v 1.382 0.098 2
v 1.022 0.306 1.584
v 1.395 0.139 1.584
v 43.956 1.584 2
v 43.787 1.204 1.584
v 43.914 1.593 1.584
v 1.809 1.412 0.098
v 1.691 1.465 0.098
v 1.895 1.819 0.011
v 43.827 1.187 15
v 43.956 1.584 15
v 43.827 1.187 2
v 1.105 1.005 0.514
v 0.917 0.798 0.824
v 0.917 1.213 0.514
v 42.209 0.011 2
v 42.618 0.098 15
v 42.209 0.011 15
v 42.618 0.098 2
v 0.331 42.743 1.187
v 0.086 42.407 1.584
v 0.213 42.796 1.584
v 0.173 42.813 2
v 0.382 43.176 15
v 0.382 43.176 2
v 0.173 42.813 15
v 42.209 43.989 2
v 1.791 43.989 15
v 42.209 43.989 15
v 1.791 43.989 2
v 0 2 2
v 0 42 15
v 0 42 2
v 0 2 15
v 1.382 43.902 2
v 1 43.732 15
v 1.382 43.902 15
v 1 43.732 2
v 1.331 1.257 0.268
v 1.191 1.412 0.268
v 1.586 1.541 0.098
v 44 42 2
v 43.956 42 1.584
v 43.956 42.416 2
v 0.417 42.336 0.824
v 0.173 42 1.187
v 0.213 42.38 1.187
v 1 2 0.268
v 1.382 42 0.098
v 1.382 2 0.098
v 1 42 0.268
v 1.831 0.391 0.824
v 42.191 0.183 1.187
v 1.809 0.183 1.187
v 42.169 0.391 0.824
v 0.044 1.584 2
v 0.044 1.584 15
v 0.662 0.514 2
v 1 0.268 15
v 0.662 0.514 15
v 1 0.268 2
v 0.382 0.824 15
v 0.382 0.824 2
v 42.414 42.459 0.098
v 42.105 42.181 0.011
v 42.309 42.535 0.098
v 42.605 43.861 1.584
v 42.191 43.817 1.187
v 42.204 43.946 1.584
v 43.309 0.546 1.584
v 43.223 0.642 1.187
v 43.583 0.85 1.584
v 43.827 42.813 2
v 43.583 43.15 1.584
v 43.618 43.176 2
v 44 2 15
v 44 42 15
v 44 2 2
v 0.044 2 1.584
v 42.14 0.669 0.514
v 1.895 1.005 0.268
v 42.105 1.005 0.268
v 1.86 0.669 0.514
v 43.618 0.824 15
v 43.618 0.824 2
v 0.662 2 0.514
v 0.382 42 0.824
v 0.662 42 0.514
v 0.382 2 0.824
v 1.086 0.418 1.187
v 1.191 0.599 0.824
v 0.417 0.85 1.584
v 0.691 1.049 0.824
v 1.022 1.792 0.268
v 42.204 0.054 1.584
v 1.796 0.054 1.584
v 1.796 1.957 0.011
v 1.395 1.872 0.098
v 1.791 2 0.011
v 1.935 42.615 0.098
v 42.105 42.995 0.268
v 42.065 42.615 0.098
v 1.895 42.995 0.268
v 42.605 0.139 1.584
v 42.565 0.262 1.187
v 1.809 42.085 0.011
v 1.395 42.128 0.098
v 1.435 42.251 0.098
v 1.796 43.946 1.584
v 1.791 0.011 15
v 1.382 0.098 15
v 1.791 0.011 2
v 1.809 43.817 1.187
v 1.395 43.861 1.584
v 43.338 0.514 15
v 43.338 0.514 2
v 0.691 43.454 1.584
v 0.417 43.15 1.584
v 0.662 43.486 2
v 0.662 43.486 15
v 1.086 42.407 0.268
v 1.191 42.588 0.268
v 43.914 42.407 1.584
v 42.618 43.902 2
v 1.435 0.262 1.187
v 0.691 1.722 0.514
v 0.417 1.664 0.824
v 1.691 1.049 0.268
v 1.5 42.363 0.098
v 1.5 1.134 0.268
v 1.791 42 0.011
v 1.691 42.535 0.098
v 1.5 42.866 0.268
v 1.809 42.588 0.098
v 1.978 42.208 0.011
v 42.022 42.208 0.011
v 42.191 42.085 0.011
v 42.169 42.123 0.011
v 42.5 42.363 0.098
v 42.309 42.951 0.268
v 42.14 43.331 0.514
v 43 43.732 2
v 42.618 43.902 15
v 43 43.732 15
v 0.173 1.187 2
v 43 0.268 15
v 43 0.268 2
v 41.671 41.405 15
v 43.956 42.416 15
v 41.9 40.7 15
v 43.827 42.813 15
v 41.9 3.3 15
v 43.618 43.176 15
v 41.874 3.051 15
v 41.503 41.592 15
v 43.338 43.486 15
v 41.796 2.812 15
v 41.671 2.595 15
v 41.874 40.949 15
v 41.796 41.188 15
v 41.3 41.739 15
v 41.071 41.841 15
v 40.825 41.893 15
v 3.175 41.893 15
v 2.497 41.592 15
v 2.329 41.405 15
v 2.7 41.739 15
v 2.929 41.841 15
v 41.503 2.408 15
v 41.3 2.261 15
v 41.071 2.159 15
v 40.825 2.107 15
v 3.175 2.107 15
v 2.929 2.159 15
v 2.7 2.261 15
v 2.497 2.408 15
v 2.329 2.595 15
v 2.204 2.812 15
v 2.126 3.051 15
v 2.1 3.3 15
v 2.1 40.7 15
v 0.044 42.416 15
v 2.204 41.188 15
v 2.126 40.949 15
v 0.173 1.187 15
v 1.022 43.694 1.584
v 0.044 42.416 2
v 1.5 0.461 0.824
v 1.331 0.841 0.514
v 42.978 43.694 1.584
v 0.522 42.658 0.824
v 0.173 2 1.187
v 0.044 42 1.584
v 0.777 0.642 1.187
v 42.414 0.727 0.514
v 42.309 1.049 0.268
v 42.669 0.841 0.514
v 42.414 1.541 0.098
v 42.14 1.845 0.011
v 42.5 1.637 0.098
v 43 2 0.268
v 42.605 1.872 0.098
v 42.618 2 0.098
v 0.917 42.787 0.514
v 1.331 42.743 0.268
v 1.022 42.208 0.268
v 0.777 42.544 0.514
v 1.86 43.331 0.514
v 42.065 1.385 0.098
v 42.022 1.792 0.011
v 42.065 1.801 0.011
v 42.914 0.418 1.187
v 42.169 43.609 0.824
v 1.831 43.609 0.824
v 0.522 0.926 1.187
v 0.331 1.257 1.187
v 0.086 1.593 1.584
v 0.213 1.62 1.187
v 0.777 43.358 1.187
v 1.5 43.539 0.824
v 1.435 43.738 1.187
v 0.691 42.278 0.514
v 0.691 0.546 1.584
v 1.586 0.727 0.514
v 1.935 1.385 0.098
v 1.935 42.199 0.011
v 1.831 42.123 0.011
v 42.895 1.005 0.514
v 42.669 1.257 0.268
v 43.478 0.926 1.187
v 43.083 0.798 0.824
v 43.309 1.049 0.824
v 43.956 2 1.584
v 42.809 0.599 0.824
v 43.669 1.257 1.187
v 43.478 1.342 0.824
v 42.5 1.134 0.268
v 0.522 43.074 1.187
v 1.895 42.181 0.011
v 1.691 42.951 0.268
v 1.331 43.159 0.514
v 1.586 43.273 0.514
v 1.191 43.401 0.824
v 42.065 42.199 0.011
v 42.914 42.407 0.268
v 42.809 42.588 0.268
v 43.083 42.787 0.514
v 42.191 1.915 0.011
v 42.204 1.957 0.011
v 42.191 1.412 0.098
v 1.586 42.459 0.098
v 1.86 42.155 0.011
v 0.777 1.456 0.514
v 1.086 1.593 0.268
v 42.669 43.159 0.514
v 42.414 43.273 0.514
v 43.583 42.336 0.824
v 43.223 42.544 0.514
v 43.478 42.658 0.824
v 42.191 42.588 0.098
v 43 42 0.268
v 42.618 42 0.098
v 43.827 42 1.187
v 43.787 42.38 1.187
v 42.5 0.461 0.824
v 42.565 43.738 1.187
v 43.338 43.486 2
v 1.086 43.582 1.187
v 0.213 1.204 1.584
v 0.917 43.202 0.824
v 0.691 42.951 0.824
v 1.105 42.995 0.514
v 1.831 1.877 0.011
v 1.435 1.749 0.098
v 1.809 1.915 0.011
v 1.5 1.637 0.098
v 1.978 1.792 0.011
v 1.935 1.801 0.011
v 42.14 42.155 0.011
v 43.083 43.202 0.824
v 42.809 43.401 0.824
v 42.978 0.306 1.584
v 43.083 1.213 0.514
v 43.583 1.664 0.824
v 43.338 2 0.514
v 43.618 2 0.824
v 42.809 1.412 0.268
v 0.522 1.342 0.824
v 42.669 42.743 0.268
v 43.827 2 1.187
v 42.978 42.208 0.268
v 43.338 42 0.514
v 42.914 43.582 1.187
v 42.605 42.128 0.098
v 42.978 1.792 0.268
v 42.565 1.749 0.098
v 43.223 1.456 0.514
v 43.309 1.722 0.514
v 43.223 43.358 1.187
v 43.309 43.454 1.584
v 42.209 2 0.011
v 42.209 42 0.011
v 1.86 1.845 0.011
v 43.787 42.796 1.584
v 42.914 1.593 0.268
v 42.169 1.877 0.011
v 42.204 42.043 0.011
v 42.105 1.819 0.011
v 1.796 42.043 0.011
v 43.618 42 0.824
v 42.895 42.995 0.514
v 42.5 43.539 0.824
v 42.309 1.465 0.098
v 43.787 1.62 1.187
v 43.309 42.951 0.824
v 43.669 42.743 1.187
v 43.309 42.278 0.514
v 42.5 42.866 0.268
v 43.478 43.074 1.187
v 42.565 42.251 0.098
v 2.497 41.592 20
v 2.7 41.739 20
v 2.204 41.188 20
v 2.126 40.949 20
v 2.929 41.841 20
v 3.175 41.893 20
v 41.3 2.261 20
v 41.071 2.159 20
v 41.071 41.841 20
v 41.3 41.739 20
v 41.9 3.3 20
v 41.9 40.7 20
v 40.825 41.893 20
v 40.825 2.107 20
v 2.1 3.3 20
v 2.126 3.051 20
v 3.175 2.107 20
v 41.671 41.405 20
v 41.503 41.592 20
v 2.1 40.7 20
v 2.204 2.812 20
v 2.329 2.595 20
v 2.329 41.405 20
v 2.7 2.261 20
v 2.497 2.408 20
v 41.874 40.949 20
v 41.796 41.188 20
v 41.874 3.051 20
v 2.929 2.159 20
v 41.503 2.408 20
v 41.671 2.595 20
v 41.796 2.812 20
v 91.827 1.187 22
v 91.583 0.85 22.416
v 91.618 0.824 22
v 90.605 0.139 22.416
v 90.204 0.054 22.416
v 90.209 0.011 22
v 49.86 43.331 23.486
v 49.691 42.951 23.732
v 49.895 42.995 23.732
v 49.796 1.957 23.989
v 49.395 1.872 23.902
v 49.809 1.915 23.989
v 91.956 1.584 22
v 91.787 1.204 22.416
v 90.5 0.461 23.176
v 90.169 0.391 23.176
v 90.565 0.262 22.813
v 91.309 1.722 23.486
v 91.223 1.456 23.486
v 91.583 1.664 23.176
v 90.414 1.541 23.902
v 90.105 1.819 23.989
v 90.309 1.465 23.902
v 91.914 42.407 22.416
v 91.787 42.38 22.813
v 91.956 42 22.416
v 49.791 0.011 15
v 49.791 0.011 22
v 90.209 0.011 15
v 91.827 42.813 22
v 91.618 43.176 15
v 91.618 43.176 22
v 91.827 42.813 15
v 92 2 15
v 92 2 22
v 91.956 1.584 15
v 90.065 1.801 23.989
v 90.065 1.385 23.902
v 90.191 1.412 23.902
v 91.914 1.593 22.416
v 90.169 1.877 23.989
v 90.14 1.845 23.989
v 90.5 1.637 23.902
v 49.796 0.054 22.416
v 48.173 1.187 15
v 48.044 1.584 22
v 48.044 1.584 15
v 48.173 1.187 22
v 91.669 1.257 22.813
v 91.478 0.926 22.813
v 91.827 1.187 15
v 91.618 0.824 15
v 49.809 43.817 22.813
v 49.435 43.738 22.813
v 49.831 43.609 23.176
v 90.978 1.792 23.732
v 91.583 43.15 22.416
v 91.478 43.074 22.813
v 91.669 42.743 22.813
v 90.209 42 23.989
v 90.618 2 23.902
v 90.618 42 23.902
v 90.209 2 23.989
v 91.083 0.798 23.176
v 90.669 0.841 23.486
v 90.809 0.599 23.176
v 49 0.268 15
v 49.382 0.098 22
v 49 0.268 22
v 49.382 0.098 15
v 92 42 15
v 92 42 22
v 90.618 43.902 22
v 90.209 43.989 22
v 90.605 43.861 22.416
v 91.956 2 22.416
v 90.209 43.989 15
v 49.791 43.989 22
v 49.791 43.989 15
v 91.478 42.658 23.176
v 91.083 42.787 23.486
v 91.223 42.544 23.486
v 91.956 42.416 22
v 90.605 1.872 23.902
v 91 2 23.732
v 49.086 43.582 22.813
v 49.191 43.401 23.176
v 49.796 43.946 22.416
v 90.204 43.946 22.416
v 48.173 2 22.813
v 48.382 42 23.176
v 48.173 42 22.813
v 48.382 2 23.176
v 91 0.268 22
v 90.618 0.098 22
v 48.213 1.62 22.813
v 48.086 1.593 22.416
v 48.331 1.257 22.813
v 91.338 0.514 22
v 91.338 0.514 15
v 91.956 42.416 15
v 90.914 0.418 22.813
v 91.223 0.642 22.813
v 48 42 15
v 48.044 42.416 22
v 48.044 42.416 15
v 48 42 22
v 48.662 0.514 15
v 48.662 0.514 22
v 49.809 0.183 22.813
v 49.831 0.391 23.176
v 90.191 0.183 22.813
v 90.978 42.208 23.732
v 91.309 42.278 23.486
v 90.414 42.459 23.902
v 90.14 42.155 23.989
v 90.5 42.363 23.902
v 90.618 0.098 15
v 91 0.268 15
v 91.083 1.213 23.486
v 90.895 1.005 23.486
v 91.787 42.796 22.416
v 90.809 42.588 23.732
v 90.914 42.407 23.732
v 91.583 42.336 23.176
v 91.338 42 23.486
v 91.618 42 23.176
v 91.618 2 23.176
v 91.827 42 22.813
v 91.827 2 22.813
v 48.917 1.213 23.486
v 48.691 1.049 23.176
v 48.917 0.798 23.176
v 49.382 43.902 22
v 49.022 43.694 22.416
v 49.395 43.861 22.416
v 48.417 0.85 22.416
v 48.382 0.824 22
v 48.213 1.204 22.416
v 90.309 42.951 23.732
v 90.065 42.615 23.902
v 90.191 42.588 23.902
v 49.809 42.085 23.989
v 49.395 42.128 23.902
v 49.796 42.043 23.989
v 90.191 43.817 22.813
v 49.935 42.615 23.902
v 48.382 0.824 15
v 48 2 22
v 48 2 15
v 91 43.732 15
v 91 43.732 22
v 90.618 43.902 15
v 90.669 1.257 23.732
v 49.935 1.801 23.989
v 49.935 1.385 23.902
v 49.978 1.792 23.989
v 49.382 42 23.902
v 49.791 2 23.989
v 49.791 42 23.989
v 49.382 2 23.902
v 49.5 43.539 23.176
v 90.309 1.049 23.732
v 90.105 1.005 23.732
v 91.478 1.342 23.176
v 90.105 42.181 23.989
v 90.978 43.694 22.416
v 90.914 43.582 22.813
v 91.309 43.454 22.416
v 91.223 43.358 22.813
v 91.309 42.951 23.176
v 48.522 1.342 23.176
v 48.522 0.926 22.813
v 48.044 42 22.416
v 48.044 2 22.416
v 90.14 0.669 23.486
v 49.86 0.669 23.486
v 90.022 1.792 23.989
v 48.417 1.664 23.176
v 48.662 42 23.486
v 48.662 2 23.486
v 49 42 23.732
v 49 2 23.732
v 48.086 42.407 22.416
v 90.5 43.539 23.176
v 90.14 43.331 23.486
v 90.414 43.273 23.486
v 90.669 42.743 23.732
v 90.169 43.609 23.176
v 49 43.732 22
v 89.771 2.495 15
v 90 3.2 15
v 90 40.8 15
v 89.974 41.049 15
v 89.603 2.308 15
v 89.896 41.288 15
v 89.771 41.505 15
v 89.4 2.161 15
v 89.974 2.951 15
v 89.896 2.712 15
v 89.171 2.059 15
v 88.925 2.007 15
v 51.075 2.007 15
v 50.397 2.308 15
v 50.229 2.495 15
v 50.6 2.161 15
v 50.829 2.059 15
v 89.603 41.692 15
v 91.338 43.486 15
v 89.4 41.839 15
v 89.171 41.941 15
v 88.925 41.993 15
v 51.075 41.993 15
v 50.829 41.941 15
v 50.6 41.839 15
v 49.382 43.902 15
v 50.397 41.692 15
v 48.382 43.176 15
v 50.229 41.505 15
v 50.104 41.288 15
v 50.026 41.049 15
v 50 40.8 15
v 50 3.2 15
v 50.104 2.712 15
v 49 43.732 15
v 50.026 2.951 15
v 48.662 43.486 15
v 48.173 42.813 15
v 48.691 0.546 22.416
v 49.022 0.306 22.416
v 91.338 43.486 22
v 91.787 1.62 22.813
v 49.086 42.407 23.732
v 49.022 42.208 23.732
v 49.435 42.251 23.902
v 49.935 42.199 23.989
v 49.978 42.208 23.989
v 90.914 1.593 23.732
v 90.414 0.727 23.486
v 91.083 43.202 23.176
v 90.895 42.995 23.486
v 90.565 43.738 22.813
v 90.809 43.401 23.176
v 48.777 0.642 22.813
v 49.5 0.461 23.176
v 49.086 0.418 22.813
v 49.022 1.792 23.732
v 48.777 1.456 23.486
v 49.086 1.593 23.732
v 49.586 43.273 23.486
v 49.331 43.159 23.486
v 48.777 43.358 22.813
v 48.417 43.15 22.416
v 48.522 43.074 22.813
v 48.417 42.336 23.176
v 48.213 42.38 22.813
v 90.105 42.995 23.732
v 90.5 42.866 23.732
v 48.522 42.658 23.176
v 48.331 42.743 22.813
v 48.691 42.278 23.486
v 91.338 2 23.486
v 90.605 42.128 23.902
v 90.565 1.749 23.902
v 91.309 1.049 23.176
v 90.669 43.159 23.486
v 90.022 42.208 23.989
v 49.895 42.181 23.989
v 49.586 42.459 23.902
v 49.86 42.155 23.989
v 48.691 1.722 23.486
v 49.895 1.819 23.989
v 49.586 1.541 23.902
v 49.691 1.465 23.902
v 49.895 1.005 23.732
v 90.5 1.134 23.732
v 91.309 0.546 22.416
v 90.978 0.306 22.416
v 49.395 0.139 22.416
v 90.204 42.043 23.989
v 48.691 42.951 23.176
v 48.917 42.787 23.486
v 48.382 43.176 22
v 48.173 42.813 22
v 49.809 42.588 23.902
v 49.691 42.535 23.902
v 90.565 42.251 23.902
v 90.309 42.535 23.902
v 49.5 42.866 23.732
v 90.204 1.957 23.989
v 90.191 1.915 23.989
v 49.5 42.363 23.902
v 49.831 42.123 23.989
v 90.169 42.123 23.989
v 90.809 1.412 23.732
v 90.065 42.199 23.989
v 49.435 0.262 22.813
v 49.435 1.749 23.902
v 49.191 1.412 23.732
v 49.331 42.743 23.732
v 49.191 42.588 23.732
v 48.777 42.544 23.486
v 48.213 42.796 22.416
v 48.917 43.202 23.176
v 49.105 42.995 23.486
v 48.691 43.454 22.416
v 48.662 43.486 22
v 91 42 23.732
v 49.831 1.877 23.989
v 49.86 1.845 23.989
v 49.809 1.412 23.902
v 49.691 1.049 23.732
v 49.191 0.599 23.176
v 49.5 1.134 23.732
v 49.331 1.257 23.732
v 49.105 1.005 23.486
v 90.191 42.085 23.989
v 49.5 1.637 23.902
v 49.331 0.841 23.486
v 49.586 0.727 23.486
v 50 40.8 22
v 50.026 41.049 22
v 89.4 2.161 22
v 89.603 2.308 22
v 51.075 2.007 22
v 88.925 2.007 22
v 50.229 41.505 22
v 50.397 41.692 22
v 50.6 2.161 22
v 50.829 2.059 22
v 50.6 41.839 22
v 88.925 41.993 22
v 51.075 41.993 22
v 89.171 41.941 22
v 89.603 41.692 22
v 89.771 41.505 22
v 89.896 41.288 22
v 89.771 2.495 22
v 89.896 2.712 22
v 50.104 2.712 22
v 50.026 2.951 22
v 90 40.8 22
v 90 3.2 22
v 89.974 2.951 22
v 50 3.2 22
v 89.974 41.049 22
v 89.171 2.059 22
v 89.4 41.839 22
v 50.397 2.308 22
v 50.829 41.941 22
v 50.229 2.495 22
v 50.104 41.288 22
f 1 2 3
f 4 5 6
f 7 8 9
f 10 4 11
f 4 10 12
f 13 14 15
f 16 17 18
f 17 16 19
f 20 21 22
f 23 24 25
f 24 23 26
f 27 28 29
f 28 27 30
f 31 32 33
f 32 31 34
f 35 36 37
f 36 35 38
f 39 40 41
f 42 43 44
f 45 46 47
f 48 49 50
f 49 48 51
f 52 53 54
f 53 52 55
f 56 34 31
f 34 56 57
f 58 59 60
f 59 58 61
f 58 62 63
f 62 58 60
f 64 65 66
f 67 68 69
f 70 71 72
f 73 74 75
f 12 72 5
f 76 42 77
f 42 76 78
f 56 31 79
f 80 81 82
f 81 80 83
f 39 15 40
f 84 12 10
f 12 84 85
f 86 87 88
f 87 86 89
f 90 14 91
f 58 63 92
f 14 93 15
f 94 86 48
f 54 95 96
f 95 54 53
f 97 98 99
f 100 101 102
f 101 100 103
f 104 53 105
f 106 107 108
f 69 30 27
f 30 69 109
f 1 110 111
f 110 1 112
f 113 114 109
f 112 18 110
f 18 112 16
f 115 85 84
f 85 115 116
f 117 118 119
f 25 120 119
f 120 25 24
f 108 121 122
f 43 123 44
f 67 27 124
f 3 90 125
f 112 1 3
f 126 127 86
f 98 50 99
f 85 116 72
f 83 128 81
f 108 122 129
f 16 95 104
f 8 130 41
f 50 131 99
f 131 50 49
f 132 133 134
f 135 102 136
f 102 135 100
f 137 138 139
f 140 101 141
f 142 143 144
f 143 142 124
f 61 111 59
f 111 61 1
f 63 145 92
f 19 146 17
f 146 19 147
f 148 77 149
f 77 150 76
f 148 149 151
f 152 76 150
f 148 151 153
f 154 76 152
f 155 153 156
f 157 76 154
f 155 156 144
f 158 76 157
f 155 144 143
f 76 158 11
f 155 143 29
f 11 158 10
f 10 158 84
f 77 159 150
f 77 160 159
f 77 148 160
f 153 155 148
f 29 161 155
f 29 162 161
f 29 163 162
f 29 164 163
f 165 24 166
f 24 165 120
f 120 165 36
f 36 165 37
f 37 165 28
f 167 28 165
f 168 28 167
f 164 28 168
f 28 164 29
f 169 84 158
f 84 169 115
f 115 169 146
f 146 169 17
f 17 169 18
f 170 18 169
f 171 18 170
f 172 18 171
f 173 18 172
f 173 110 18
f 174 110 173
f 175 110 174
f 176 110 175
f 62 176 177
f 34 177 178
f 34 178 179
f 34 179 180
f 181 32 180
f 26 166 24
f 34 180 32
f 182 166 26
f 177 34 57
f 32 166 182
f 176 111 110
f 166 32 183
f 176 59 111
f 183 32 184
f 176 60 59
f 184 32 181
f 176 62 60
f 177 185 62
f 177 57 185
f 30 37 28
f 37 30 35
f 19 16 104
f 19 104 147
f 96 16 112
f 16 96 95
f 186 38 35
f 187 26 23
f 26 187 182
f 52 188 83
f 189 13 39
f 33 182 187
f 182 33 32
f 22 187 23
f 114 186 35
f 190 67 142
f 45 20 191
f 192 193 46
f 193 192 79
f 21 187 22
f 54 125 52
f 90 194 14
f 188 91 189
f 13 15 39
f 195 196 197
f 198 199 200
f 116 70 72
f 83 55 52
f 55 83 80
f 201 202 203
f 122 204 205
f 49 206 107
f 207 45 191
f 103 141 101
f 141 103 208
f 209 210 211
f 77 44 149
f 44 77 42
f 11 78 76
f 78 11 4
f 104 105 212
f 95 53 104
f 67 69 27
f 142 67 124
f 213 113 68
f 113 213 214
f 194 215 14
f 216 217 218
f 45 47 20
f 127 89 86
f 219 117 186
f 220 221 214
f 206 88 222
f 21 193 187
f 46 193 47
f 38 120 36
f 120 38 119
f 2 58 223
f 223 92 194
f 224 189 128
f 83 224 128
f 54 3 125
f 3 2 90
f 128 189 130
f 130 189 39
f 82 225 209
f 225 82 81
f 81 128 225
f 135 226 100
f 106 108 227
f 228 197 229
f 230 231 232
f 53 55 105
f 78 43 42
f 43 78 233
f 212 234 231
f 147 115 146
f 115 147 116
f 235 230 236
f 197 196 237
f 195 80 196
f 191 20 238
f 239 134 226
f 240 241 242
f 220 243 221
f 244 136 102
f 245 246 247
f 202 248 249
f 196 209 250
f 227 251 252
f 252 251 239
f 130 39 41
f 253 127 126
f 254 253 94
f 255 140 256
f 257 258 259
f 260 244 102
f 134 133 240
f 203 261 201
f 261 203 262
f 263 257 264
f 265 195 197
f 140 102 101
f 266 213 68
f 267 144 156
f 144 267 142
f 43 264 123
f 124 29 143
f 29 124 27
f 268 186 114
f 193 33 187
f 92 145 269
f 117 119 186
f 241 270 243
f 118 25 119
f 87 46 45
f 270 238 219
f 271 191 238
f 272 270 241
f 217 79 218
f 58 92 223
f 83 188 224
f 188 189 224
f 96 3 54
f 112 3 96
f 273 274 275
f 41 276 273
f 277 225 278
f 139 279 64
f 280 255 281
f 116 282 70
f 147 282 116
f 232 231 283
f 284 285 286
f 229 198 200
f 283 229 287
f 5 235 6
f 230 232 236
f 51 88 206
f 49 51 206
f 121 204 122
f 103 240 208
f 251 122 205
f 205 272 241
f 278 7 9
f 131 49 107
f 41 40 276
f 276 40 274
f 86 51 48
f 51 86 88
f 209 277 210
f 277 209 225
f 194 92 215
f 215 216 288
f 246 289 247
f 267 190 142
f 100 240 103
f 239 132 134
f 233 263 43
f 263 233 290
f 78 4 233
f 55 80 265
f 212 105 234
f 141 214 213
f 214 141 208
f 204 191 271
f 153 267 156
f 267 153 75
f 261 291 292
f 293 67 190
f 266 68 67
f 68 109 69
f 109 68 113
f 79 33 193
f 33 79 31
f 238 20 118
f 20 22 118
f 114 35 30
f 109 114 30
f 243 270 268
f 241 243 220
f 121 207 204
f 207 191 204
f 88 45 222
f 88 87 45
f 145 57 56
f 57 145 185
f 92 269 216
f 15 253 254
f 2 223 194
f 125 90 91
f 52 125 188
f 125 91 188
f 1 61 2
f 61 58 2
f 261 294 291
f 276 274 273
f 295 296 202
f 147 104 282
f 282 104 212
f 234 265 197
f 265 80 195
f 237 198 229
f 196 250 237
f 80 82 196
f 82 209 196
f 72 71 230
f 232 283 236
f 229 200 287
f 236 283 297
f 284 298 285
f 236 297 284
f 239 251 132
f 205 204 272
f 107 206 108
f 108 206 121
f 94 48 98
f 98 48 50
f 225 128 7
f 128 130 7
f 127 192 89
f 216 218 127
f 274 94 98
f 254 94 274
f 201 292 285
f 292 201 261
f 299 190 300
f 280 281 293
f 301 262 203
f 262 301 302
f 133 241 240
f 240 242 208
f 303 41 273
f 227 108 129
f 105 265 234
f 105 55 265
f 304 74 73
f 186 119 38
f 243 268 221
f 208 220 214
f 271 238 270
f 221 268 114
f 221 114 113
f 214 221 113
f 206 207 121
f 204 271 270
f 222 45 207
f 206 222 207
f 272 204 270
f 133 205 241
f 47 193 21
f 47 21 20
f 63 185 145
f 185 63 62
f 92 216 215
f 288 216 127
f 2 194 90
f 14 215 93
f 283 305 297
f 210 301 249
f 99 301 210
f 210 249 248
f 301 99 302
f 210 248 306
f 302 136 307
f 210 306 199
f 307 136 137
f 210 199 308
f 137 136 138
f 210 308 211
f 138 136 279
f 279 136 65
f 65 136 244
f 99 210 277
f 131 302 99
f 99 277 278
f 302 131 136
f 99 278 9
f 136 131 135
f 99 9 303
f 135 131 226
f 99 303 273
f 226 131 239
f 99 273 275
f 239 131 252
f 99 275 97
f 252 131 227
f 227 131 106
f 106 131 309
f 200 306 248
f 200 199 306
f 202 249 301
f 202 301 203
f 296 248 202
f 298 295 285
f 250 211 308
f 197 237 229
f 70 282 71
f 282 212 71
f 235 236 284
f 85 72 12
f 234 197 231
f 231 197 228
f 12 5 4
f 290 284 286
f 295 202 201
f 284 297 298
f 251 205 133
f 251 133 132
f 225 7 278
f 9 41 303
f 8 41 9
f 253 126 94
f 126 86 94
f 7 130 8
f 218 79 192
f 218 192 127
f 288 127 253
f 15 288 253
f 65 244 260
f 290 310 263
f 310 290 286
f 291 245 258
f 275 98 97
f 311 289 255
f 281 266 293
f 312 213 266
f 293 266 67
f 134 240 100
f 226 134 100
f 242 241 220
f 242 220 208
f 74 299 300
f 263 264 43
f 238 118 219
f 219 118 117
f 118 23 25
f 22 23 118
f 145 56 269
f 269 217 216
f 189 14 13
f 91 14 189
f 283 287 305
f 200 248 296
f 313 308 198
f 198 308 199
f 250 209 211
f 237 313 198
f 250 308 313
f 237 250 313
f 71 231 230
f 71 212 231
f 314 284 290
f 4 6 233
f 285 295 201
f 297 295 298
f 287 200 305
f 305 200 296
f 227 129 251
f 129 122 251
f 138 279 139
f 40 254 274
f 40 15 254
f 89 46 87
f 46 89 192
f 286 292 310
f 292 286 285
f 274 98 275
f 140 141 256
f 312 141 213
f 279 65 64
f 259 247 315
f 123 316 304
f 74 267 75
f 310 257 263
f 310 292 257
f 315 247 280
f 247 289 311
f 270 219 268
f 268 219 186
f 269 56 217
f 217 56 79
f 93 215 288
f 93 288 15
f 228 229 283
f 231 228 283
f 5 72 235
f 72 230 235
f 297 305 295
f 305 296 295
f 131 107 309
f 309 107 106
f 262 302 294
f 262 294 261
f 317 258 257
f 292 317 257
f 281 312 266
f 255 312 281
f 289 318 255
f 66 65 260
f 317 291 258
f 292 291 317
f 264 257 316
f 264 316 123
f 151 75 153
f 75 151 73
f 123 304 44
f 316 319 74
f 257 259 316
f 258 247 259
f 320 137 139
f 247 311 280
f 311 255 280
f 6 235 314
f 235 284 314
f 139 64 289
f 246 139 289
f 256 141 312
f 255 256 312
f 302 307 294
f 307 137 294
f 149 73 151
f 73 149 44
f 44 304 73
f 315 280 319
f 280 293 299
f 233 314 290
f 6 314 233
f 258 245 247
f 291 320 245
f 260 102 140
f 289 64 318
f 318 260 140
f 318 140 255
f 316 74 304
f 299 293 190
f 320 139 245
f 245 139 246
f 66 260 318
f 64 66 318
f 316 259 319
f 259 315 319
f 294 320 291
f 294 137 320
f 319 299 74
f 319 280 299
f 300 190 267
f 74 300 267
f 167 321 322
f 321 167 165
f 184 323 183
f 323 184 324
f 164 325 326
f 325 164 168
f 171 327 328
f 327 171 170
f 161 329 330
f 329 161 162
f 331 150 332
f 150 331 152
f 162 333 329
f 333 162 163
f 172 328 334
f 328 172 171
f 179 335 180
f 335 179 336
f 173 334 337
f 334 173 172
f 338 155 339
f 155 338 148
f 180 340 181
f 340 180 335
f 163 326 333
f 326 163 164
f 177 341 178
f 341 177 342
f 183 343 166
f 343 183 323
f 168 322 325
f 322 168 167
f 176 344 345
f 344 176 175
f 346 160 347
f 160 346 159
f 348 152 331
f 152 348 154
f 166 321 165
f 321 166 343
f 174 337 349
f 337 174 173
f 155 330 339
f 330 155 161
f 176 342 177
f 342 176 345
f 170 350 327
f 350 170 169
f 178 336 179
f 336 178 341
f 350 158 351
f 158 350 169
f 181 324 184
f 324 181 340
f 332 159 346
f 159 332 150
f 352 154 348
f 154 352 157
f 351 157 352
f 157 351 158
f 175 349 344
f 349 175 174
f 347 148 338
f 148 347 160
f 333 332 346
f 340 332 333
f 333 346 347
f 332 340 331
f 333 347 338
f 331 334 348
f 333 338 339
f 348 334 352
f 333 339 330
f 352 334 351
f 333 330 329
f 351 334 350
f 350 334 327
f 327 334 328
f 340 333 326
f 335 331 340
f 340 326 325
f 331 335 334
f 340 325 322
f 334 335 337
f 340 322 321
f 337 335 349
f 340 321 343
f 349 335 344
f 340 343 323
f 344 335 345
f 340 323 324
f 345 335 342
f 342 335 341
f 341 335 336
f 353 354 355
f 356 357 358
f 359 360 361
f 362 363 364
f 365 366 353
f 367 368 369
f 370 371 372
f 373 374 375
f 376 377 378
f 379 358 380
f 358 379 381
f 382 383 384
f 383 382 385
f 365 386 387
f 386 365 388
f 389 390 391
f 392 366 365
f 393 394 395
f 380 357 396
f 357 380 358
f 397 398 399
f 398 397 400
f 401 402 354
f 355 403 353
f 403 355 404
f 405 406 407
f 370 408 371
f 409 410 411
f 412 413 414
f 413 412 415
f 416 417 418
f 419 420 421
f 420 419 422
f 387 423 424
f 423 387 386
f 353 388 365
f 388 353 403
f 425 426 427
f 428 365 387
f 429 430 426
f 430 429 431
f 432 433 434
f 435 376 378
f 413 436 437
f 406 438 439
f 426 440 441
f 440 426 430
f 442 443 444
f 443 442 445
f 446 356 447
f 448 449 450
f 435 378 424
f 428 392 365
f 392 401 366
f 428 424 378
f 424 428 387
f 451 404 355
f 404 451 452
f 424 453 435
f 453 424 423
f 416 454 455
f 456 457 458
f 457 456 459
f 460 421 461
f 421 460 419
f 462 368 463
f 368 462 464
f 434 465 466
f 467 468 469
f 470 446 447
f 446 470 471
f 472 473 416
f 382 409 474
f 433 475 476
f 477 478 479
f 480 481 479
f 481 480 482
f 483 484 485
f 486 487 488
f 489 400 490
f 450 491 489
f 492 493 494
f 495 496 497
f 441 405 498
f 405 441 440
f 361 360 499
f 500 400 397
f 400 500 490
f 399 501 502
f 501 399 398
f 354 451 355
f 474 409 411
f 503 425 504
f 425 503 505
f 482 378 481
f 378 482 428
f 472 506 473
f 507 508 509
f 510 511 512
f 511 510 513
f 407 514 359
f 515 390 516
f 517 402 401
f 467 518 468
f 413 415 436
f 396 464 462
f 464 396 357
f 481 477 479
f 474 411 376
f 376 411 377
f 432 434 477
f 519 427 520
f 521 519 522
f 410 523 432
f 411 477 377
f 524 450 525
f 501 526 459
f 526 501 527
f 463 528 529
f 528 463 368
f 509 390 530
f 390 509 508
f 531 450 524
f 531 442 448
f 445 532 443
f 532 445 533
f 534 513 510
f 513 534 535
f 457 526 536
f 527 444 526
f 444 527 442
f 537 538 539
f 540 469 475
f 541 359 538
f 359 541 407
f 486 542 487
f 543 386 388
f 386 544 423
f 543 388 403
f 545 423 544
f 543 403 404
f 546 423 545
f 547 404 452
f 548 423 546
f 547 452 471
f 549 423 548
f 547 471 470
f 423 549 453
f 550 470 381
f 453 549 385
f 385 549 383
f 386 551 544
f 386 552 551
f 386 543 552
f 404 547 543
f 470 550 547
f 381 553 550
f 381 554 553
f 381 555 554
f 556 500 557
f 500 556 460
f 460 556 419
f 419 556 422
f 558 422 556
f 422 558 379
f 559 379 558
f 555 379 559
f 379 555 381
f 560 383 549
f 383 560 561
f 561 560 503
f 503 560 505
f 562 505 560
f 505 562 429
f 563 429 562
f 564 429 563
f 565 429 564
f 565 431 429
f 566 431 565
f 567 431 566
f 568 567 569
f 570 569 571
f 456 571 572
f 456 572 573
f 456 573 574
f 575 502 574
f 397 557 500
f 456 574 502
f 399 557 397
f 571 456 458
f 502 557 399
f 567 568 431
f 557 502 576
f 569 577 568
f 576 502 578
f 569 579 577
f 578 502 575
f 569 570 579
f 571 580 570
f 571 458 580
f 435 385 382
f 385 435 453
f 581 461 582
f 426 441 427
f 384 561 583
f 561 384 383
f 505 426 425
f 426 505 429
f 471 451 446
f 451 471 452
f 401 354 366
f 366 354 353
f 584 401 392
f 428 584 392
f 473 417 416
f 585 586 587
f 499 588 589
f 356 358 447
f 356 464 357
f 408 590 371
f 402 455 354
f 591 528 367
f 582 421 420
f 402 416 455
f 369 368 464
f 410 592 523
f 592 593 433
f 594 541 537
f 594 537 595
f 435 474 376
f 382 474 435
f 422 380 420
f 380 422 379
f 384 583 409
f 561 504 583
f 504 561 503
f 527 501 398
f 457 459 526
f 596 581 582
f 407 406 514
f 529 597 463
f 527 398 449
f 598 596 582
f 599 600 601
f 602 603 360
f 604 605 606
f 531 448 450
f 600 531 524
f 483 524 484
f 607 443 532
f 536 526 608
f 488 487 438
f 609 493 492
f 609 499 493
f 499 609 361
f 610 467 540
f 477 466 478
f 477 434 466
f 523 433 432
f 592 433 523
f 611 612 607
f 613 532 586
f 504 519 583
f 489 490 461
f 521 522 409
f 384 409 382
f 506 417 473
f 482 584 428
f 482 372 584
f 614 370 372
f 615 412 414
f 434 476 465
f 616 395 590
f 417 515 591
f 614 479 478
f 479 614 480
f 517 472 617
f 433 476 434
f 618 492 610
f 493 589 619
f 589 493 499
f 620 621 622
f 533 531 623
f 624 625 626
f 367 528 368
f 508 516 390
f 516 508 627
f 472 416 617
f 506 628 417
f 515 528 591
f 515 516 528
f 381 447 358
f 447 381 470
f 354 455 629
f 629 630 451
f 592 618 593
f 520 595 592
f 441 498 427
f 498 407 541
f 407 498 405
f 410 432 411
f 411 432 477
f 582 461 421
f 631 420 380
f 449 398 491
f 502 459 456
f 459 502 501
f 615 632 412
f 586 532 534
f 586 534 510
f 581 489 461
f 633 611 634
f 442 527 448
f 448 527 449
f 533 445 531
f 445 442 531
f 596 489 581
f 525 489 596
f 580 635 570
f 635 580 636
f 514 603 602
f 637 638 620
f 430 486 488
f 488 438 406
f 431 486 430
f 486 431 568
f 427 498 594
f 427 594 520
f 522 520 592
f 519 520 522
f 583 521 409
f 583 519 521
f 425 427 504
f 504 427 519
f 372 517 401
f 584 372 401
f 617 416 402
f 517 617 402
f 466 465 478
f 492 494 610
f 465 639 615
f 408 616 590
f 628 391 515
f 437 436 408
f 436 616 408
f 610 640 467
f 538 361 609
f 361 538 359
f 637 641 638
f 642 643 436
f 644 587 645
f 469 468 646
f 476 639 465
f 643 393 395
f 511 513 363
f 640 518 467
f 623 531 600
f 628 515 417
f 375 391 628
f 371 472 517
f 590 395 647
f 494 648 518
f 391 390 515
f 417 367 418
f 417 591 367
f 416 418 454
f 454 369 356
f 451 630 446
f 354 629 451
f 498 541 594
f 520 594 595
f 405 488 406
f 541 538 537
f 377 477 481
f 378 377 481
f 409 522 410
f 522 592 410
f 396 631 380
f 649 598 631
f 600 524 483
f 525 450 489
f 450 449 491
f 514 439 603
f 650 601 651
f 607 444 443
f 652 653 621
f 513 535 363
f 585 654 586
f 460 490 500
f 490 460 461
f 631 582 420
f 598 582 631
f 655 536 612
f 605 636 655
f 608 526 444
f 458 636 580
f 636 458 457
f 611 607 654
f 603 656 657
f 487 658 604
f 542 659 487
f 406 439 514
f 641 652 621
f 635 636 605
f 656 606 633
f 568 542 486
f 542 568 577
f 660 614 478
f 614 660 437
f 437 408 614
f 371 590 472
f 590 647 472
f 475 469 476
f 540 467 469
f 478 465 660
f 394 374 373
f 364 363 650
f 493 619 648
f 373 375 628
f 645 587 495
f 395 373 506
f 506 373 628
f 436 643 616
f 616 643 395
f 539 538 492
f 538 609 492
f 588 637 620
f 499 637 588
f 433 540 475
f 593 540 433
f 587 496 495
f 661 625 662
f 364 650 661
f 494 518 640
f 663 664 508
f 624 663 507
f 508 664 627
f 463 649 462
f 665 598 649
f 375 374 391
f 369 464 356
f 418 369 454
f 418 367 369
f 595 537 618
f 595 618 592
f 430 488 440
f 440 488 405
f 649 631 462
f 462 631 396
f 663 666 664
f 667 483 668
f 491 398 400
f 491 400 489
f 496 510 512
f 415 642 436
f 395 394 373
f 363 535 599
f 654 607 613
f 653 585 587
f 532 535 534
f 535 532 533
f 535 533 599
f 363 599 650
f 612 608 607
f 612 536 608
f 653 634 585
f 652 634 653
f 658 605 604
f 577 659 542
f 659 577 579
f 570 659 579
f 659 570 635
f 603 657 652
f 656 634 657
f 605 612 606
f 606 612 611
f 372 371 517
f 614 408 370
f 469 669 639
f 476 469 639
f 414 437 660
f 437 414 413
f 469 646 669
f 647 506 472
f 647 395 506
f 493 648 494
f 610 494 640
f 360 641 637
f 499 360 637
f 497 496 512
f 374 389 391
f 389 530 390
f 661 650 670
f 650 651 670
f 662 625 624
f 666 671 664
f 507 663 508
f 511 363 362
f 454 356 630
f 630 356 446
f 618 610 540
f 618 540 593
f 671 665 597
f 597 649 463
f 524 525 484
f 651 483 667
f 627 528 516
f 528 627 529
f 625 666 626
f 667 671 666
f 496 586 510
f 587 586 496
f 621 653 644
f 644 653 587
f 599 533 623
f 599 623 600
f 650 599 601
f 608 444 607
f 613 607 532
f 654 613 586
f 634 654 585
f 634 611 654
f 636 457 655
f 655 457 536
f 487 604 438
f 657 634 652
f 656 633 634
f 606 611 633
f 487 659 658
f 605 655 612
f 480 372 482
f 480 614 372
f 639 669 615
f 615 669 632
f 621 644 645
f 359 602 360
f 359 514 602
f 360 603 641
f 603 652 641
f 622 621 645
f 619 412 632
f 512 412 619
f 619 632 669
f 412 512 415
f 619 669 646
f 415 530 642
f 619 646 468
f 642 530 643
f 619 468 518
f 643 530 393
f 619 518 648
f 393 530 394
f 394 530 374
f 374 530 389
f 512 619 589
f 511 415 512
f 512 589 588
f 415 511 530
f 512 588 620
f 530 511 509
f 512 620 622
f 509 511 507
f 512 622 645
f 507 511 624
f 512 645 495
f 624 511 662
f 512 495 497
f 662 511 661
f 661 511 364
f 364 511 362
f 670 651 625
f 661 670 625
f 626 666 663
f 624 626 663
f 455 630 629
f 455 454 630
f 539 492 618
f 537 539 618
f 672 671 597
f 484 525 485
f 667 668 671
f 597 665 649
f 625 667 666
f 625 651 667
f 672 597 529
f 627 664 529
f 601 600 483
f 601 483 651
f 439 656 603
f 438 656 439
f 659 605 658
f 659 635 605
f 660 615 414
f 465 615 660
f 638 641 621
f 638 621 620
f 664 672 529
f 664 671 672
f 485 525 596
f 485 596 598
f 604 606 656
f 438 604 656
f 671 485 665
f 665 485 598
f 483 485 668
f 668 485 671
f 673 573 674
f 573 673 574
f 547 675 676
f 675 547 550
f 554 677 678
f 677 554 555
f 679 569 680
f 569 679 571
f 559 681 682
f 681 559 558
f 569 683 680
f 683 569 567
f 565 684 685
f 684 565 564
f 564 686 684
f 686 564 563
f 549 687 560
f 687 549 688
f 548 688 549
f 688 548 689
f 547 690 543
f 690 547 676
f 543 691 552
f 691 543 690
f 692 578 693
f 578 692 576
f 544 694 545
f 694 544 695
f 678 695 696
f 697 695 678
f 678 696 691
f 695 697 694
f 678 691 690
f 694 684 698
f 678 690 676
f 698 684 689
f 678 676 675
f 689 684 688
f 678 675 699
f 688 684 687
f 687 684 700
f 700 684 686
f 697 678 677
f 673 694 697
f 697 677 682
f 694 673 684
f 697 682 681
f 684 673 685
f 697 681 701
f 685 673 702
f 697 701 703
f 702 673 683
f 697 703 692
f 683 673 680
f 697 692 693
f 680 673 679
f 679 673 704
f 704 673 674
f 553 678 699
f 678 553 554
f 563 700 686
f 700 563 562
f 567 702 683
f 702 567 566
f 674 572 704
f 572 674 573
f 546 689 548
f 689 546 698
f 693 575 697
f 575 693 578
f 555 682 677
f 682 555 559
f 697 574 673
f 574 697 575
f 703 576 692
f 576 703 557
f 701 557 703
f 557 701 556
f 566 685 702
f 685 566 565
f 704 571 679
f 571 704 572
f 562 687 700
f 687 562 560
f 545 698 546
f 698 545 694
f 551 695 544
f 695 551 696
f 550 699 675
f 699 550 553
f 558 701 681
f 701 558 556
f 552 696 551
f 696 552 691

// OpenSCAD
// file: logo45.scad
module logo45() translate([-100,-130,0]) import(file = "../res/45.svg");

logo45();
// main file
// A rounded box with a lid
use <./logo45.scad>

$fn = 30;
// Parameters
// - dimension: [x, y, z] - x is front, y is depth, z is height (total)
//   Dimension is treated as INNER dimension, meaning walls will be added on all sides.
// - wall: number - default 2 - thickness of lid, lid edge (and hollow box of selected.
// - use_logo: boolean - default true
// - solid: boolean - default true - whether box is a solid block inside. Used for hollowing the box to create inserts.
// If false, the box will have wall*2 thickness (lid has wall*1)
// - inner_tolerance: number - default 2 - distance between lid and top of box on the inside.
module box_with_lid(dimensions = [ 40, 40, 20 ], wall = 2, use_logo = true, solid = true, inner_tolerance = 2,
                    lid_overlap = 5)
{
    printer_tolerance = 0.1; // Used to add a /little/ extra space for the lid to not get stuck
    lid_height = wall + inner_tolerance + lid_overlap;

    box_bottom();
    translate([ dimensions[0] + wall * 4, 0, 0 ]) box_lid();

    module box_bottom()
    {

        hull()
        {
            // helpers to avoid repetion below
            tr = wall; // Spheres and cylinders centers around origo
            tx = dimensions[0] - tr + wall * 2;
            ty = dimensions[1] - tr + wall * 2;
            tz = dimensions[2] - (tr + inner_tolerance) + wall;

            // Bottom
            translate([ tr, tr, tr ]) sphere(wall);
            translate([ tx, tr, tr ]) sphere(wall);
            translate([ tr, ty, tr ]) sphere(wall);
            translate([ tx, ty, tr ]) sphere(wall);
            // Top
            translate([ tr, tr, tz - lid_overlap ]) cylinder(r = wall, h = wall);
            translate([ tx, tr, tz - lid_overlap ]) cylinder(r = wall, h = wall);
            translate([ tr, ty, tz - lid_overlap ]) cylinder(r = wall, h = wall);
            translate([ tx, ty, tz - lid_overlap ]) cylinder(r = wall, h = wall);
        }

        hull()
        {
            r = wall * 0.6; // Inner radius
            // TBD: Find the right fraction for this rounding, or just use the magic number?
            tr = r + wall + printer_tolerance;
            tx = dimensions[0] - tr + wall * 2;
            ty = dimensions[1] - tr + wall * 2;
            tz = dimensions[2] - (lid_overlap + inner_tolerance) + wall;

            translate([ tr, tr, tz ]) cylinder(h = lid_overlap, r = r);
            translate([ tx, tr, tz ]) cylinder(h = lid_overlap, r = r);
            translate([ tr, ty, tz ]) cylinder(h = lid_overlap, r = r);
            translate([ tx, ty, tz ]) cylinder(h = lid_overlap, r = r);
        }
    }

    module box_lid()
    {
        lid_inner_height = lid_overlap + inner_tolerance;

        difference()
        {
            hull()
            {
                // helpers to avoid repetion below
                tr = wall; // Spheres and cylinders centers around origo
                tx = dimensions[0] - tr + wall * 2;
                ty = dimensions[1] - tr + wall * 2;
                tz = dimensions[2] - tr + wall * 2;
                tzb = tz - lid_overlap - inner_tolerance;

                // Top
                translate([ tr, tr, tz ]) sphere(wall);
                translate([ tx, tr, tz ]) sphere(wall);
                translate([ tr, ty, tz ]) sphere(wall);
                translate([ tx, ty, tz ]) sphere(wall);
                // Bottom
                translate([ tr, tr, tzb ]) cylinder(r = wall, h = wall);
                translate([ tx, tr, tzb ]) cylinder(r = wall, h = wall);
                translate([ tr, ty, tzb ]) cylinder(r = wall, h = wall);
                translate([ tx, ty, tzb ]) cylinder(r = wall, h = wall);
            }

            hull()
            {
                r = wall * 0.6; // Inner radius
                // TBD: Find the right fraction for this rounding, or just use the magic number?
                tr = r + wall;
                tx = dimensions[0] - tr + wall * 2;
                ty = dimensions[1] - tr + wall * 2;
                tz = dimensions[2] - (lid_overlap + inner_tolerance + wall) + wall * 2;
                translate([ tr, tr, tz ]) cylinder(h = lid_inner_height, r = r);
                translate([ tx, tr, tz ]) cylinder(h = lid_inner_height, r = r);
                translate([ tr, ty, tz ]) cylinder(h = lid_inner_height, r = r);
                translate([ tx, ty, tz ]) cylinder(h = lid_inner_height, r = r);
            }
        }
    }
}

box_with_lid();
